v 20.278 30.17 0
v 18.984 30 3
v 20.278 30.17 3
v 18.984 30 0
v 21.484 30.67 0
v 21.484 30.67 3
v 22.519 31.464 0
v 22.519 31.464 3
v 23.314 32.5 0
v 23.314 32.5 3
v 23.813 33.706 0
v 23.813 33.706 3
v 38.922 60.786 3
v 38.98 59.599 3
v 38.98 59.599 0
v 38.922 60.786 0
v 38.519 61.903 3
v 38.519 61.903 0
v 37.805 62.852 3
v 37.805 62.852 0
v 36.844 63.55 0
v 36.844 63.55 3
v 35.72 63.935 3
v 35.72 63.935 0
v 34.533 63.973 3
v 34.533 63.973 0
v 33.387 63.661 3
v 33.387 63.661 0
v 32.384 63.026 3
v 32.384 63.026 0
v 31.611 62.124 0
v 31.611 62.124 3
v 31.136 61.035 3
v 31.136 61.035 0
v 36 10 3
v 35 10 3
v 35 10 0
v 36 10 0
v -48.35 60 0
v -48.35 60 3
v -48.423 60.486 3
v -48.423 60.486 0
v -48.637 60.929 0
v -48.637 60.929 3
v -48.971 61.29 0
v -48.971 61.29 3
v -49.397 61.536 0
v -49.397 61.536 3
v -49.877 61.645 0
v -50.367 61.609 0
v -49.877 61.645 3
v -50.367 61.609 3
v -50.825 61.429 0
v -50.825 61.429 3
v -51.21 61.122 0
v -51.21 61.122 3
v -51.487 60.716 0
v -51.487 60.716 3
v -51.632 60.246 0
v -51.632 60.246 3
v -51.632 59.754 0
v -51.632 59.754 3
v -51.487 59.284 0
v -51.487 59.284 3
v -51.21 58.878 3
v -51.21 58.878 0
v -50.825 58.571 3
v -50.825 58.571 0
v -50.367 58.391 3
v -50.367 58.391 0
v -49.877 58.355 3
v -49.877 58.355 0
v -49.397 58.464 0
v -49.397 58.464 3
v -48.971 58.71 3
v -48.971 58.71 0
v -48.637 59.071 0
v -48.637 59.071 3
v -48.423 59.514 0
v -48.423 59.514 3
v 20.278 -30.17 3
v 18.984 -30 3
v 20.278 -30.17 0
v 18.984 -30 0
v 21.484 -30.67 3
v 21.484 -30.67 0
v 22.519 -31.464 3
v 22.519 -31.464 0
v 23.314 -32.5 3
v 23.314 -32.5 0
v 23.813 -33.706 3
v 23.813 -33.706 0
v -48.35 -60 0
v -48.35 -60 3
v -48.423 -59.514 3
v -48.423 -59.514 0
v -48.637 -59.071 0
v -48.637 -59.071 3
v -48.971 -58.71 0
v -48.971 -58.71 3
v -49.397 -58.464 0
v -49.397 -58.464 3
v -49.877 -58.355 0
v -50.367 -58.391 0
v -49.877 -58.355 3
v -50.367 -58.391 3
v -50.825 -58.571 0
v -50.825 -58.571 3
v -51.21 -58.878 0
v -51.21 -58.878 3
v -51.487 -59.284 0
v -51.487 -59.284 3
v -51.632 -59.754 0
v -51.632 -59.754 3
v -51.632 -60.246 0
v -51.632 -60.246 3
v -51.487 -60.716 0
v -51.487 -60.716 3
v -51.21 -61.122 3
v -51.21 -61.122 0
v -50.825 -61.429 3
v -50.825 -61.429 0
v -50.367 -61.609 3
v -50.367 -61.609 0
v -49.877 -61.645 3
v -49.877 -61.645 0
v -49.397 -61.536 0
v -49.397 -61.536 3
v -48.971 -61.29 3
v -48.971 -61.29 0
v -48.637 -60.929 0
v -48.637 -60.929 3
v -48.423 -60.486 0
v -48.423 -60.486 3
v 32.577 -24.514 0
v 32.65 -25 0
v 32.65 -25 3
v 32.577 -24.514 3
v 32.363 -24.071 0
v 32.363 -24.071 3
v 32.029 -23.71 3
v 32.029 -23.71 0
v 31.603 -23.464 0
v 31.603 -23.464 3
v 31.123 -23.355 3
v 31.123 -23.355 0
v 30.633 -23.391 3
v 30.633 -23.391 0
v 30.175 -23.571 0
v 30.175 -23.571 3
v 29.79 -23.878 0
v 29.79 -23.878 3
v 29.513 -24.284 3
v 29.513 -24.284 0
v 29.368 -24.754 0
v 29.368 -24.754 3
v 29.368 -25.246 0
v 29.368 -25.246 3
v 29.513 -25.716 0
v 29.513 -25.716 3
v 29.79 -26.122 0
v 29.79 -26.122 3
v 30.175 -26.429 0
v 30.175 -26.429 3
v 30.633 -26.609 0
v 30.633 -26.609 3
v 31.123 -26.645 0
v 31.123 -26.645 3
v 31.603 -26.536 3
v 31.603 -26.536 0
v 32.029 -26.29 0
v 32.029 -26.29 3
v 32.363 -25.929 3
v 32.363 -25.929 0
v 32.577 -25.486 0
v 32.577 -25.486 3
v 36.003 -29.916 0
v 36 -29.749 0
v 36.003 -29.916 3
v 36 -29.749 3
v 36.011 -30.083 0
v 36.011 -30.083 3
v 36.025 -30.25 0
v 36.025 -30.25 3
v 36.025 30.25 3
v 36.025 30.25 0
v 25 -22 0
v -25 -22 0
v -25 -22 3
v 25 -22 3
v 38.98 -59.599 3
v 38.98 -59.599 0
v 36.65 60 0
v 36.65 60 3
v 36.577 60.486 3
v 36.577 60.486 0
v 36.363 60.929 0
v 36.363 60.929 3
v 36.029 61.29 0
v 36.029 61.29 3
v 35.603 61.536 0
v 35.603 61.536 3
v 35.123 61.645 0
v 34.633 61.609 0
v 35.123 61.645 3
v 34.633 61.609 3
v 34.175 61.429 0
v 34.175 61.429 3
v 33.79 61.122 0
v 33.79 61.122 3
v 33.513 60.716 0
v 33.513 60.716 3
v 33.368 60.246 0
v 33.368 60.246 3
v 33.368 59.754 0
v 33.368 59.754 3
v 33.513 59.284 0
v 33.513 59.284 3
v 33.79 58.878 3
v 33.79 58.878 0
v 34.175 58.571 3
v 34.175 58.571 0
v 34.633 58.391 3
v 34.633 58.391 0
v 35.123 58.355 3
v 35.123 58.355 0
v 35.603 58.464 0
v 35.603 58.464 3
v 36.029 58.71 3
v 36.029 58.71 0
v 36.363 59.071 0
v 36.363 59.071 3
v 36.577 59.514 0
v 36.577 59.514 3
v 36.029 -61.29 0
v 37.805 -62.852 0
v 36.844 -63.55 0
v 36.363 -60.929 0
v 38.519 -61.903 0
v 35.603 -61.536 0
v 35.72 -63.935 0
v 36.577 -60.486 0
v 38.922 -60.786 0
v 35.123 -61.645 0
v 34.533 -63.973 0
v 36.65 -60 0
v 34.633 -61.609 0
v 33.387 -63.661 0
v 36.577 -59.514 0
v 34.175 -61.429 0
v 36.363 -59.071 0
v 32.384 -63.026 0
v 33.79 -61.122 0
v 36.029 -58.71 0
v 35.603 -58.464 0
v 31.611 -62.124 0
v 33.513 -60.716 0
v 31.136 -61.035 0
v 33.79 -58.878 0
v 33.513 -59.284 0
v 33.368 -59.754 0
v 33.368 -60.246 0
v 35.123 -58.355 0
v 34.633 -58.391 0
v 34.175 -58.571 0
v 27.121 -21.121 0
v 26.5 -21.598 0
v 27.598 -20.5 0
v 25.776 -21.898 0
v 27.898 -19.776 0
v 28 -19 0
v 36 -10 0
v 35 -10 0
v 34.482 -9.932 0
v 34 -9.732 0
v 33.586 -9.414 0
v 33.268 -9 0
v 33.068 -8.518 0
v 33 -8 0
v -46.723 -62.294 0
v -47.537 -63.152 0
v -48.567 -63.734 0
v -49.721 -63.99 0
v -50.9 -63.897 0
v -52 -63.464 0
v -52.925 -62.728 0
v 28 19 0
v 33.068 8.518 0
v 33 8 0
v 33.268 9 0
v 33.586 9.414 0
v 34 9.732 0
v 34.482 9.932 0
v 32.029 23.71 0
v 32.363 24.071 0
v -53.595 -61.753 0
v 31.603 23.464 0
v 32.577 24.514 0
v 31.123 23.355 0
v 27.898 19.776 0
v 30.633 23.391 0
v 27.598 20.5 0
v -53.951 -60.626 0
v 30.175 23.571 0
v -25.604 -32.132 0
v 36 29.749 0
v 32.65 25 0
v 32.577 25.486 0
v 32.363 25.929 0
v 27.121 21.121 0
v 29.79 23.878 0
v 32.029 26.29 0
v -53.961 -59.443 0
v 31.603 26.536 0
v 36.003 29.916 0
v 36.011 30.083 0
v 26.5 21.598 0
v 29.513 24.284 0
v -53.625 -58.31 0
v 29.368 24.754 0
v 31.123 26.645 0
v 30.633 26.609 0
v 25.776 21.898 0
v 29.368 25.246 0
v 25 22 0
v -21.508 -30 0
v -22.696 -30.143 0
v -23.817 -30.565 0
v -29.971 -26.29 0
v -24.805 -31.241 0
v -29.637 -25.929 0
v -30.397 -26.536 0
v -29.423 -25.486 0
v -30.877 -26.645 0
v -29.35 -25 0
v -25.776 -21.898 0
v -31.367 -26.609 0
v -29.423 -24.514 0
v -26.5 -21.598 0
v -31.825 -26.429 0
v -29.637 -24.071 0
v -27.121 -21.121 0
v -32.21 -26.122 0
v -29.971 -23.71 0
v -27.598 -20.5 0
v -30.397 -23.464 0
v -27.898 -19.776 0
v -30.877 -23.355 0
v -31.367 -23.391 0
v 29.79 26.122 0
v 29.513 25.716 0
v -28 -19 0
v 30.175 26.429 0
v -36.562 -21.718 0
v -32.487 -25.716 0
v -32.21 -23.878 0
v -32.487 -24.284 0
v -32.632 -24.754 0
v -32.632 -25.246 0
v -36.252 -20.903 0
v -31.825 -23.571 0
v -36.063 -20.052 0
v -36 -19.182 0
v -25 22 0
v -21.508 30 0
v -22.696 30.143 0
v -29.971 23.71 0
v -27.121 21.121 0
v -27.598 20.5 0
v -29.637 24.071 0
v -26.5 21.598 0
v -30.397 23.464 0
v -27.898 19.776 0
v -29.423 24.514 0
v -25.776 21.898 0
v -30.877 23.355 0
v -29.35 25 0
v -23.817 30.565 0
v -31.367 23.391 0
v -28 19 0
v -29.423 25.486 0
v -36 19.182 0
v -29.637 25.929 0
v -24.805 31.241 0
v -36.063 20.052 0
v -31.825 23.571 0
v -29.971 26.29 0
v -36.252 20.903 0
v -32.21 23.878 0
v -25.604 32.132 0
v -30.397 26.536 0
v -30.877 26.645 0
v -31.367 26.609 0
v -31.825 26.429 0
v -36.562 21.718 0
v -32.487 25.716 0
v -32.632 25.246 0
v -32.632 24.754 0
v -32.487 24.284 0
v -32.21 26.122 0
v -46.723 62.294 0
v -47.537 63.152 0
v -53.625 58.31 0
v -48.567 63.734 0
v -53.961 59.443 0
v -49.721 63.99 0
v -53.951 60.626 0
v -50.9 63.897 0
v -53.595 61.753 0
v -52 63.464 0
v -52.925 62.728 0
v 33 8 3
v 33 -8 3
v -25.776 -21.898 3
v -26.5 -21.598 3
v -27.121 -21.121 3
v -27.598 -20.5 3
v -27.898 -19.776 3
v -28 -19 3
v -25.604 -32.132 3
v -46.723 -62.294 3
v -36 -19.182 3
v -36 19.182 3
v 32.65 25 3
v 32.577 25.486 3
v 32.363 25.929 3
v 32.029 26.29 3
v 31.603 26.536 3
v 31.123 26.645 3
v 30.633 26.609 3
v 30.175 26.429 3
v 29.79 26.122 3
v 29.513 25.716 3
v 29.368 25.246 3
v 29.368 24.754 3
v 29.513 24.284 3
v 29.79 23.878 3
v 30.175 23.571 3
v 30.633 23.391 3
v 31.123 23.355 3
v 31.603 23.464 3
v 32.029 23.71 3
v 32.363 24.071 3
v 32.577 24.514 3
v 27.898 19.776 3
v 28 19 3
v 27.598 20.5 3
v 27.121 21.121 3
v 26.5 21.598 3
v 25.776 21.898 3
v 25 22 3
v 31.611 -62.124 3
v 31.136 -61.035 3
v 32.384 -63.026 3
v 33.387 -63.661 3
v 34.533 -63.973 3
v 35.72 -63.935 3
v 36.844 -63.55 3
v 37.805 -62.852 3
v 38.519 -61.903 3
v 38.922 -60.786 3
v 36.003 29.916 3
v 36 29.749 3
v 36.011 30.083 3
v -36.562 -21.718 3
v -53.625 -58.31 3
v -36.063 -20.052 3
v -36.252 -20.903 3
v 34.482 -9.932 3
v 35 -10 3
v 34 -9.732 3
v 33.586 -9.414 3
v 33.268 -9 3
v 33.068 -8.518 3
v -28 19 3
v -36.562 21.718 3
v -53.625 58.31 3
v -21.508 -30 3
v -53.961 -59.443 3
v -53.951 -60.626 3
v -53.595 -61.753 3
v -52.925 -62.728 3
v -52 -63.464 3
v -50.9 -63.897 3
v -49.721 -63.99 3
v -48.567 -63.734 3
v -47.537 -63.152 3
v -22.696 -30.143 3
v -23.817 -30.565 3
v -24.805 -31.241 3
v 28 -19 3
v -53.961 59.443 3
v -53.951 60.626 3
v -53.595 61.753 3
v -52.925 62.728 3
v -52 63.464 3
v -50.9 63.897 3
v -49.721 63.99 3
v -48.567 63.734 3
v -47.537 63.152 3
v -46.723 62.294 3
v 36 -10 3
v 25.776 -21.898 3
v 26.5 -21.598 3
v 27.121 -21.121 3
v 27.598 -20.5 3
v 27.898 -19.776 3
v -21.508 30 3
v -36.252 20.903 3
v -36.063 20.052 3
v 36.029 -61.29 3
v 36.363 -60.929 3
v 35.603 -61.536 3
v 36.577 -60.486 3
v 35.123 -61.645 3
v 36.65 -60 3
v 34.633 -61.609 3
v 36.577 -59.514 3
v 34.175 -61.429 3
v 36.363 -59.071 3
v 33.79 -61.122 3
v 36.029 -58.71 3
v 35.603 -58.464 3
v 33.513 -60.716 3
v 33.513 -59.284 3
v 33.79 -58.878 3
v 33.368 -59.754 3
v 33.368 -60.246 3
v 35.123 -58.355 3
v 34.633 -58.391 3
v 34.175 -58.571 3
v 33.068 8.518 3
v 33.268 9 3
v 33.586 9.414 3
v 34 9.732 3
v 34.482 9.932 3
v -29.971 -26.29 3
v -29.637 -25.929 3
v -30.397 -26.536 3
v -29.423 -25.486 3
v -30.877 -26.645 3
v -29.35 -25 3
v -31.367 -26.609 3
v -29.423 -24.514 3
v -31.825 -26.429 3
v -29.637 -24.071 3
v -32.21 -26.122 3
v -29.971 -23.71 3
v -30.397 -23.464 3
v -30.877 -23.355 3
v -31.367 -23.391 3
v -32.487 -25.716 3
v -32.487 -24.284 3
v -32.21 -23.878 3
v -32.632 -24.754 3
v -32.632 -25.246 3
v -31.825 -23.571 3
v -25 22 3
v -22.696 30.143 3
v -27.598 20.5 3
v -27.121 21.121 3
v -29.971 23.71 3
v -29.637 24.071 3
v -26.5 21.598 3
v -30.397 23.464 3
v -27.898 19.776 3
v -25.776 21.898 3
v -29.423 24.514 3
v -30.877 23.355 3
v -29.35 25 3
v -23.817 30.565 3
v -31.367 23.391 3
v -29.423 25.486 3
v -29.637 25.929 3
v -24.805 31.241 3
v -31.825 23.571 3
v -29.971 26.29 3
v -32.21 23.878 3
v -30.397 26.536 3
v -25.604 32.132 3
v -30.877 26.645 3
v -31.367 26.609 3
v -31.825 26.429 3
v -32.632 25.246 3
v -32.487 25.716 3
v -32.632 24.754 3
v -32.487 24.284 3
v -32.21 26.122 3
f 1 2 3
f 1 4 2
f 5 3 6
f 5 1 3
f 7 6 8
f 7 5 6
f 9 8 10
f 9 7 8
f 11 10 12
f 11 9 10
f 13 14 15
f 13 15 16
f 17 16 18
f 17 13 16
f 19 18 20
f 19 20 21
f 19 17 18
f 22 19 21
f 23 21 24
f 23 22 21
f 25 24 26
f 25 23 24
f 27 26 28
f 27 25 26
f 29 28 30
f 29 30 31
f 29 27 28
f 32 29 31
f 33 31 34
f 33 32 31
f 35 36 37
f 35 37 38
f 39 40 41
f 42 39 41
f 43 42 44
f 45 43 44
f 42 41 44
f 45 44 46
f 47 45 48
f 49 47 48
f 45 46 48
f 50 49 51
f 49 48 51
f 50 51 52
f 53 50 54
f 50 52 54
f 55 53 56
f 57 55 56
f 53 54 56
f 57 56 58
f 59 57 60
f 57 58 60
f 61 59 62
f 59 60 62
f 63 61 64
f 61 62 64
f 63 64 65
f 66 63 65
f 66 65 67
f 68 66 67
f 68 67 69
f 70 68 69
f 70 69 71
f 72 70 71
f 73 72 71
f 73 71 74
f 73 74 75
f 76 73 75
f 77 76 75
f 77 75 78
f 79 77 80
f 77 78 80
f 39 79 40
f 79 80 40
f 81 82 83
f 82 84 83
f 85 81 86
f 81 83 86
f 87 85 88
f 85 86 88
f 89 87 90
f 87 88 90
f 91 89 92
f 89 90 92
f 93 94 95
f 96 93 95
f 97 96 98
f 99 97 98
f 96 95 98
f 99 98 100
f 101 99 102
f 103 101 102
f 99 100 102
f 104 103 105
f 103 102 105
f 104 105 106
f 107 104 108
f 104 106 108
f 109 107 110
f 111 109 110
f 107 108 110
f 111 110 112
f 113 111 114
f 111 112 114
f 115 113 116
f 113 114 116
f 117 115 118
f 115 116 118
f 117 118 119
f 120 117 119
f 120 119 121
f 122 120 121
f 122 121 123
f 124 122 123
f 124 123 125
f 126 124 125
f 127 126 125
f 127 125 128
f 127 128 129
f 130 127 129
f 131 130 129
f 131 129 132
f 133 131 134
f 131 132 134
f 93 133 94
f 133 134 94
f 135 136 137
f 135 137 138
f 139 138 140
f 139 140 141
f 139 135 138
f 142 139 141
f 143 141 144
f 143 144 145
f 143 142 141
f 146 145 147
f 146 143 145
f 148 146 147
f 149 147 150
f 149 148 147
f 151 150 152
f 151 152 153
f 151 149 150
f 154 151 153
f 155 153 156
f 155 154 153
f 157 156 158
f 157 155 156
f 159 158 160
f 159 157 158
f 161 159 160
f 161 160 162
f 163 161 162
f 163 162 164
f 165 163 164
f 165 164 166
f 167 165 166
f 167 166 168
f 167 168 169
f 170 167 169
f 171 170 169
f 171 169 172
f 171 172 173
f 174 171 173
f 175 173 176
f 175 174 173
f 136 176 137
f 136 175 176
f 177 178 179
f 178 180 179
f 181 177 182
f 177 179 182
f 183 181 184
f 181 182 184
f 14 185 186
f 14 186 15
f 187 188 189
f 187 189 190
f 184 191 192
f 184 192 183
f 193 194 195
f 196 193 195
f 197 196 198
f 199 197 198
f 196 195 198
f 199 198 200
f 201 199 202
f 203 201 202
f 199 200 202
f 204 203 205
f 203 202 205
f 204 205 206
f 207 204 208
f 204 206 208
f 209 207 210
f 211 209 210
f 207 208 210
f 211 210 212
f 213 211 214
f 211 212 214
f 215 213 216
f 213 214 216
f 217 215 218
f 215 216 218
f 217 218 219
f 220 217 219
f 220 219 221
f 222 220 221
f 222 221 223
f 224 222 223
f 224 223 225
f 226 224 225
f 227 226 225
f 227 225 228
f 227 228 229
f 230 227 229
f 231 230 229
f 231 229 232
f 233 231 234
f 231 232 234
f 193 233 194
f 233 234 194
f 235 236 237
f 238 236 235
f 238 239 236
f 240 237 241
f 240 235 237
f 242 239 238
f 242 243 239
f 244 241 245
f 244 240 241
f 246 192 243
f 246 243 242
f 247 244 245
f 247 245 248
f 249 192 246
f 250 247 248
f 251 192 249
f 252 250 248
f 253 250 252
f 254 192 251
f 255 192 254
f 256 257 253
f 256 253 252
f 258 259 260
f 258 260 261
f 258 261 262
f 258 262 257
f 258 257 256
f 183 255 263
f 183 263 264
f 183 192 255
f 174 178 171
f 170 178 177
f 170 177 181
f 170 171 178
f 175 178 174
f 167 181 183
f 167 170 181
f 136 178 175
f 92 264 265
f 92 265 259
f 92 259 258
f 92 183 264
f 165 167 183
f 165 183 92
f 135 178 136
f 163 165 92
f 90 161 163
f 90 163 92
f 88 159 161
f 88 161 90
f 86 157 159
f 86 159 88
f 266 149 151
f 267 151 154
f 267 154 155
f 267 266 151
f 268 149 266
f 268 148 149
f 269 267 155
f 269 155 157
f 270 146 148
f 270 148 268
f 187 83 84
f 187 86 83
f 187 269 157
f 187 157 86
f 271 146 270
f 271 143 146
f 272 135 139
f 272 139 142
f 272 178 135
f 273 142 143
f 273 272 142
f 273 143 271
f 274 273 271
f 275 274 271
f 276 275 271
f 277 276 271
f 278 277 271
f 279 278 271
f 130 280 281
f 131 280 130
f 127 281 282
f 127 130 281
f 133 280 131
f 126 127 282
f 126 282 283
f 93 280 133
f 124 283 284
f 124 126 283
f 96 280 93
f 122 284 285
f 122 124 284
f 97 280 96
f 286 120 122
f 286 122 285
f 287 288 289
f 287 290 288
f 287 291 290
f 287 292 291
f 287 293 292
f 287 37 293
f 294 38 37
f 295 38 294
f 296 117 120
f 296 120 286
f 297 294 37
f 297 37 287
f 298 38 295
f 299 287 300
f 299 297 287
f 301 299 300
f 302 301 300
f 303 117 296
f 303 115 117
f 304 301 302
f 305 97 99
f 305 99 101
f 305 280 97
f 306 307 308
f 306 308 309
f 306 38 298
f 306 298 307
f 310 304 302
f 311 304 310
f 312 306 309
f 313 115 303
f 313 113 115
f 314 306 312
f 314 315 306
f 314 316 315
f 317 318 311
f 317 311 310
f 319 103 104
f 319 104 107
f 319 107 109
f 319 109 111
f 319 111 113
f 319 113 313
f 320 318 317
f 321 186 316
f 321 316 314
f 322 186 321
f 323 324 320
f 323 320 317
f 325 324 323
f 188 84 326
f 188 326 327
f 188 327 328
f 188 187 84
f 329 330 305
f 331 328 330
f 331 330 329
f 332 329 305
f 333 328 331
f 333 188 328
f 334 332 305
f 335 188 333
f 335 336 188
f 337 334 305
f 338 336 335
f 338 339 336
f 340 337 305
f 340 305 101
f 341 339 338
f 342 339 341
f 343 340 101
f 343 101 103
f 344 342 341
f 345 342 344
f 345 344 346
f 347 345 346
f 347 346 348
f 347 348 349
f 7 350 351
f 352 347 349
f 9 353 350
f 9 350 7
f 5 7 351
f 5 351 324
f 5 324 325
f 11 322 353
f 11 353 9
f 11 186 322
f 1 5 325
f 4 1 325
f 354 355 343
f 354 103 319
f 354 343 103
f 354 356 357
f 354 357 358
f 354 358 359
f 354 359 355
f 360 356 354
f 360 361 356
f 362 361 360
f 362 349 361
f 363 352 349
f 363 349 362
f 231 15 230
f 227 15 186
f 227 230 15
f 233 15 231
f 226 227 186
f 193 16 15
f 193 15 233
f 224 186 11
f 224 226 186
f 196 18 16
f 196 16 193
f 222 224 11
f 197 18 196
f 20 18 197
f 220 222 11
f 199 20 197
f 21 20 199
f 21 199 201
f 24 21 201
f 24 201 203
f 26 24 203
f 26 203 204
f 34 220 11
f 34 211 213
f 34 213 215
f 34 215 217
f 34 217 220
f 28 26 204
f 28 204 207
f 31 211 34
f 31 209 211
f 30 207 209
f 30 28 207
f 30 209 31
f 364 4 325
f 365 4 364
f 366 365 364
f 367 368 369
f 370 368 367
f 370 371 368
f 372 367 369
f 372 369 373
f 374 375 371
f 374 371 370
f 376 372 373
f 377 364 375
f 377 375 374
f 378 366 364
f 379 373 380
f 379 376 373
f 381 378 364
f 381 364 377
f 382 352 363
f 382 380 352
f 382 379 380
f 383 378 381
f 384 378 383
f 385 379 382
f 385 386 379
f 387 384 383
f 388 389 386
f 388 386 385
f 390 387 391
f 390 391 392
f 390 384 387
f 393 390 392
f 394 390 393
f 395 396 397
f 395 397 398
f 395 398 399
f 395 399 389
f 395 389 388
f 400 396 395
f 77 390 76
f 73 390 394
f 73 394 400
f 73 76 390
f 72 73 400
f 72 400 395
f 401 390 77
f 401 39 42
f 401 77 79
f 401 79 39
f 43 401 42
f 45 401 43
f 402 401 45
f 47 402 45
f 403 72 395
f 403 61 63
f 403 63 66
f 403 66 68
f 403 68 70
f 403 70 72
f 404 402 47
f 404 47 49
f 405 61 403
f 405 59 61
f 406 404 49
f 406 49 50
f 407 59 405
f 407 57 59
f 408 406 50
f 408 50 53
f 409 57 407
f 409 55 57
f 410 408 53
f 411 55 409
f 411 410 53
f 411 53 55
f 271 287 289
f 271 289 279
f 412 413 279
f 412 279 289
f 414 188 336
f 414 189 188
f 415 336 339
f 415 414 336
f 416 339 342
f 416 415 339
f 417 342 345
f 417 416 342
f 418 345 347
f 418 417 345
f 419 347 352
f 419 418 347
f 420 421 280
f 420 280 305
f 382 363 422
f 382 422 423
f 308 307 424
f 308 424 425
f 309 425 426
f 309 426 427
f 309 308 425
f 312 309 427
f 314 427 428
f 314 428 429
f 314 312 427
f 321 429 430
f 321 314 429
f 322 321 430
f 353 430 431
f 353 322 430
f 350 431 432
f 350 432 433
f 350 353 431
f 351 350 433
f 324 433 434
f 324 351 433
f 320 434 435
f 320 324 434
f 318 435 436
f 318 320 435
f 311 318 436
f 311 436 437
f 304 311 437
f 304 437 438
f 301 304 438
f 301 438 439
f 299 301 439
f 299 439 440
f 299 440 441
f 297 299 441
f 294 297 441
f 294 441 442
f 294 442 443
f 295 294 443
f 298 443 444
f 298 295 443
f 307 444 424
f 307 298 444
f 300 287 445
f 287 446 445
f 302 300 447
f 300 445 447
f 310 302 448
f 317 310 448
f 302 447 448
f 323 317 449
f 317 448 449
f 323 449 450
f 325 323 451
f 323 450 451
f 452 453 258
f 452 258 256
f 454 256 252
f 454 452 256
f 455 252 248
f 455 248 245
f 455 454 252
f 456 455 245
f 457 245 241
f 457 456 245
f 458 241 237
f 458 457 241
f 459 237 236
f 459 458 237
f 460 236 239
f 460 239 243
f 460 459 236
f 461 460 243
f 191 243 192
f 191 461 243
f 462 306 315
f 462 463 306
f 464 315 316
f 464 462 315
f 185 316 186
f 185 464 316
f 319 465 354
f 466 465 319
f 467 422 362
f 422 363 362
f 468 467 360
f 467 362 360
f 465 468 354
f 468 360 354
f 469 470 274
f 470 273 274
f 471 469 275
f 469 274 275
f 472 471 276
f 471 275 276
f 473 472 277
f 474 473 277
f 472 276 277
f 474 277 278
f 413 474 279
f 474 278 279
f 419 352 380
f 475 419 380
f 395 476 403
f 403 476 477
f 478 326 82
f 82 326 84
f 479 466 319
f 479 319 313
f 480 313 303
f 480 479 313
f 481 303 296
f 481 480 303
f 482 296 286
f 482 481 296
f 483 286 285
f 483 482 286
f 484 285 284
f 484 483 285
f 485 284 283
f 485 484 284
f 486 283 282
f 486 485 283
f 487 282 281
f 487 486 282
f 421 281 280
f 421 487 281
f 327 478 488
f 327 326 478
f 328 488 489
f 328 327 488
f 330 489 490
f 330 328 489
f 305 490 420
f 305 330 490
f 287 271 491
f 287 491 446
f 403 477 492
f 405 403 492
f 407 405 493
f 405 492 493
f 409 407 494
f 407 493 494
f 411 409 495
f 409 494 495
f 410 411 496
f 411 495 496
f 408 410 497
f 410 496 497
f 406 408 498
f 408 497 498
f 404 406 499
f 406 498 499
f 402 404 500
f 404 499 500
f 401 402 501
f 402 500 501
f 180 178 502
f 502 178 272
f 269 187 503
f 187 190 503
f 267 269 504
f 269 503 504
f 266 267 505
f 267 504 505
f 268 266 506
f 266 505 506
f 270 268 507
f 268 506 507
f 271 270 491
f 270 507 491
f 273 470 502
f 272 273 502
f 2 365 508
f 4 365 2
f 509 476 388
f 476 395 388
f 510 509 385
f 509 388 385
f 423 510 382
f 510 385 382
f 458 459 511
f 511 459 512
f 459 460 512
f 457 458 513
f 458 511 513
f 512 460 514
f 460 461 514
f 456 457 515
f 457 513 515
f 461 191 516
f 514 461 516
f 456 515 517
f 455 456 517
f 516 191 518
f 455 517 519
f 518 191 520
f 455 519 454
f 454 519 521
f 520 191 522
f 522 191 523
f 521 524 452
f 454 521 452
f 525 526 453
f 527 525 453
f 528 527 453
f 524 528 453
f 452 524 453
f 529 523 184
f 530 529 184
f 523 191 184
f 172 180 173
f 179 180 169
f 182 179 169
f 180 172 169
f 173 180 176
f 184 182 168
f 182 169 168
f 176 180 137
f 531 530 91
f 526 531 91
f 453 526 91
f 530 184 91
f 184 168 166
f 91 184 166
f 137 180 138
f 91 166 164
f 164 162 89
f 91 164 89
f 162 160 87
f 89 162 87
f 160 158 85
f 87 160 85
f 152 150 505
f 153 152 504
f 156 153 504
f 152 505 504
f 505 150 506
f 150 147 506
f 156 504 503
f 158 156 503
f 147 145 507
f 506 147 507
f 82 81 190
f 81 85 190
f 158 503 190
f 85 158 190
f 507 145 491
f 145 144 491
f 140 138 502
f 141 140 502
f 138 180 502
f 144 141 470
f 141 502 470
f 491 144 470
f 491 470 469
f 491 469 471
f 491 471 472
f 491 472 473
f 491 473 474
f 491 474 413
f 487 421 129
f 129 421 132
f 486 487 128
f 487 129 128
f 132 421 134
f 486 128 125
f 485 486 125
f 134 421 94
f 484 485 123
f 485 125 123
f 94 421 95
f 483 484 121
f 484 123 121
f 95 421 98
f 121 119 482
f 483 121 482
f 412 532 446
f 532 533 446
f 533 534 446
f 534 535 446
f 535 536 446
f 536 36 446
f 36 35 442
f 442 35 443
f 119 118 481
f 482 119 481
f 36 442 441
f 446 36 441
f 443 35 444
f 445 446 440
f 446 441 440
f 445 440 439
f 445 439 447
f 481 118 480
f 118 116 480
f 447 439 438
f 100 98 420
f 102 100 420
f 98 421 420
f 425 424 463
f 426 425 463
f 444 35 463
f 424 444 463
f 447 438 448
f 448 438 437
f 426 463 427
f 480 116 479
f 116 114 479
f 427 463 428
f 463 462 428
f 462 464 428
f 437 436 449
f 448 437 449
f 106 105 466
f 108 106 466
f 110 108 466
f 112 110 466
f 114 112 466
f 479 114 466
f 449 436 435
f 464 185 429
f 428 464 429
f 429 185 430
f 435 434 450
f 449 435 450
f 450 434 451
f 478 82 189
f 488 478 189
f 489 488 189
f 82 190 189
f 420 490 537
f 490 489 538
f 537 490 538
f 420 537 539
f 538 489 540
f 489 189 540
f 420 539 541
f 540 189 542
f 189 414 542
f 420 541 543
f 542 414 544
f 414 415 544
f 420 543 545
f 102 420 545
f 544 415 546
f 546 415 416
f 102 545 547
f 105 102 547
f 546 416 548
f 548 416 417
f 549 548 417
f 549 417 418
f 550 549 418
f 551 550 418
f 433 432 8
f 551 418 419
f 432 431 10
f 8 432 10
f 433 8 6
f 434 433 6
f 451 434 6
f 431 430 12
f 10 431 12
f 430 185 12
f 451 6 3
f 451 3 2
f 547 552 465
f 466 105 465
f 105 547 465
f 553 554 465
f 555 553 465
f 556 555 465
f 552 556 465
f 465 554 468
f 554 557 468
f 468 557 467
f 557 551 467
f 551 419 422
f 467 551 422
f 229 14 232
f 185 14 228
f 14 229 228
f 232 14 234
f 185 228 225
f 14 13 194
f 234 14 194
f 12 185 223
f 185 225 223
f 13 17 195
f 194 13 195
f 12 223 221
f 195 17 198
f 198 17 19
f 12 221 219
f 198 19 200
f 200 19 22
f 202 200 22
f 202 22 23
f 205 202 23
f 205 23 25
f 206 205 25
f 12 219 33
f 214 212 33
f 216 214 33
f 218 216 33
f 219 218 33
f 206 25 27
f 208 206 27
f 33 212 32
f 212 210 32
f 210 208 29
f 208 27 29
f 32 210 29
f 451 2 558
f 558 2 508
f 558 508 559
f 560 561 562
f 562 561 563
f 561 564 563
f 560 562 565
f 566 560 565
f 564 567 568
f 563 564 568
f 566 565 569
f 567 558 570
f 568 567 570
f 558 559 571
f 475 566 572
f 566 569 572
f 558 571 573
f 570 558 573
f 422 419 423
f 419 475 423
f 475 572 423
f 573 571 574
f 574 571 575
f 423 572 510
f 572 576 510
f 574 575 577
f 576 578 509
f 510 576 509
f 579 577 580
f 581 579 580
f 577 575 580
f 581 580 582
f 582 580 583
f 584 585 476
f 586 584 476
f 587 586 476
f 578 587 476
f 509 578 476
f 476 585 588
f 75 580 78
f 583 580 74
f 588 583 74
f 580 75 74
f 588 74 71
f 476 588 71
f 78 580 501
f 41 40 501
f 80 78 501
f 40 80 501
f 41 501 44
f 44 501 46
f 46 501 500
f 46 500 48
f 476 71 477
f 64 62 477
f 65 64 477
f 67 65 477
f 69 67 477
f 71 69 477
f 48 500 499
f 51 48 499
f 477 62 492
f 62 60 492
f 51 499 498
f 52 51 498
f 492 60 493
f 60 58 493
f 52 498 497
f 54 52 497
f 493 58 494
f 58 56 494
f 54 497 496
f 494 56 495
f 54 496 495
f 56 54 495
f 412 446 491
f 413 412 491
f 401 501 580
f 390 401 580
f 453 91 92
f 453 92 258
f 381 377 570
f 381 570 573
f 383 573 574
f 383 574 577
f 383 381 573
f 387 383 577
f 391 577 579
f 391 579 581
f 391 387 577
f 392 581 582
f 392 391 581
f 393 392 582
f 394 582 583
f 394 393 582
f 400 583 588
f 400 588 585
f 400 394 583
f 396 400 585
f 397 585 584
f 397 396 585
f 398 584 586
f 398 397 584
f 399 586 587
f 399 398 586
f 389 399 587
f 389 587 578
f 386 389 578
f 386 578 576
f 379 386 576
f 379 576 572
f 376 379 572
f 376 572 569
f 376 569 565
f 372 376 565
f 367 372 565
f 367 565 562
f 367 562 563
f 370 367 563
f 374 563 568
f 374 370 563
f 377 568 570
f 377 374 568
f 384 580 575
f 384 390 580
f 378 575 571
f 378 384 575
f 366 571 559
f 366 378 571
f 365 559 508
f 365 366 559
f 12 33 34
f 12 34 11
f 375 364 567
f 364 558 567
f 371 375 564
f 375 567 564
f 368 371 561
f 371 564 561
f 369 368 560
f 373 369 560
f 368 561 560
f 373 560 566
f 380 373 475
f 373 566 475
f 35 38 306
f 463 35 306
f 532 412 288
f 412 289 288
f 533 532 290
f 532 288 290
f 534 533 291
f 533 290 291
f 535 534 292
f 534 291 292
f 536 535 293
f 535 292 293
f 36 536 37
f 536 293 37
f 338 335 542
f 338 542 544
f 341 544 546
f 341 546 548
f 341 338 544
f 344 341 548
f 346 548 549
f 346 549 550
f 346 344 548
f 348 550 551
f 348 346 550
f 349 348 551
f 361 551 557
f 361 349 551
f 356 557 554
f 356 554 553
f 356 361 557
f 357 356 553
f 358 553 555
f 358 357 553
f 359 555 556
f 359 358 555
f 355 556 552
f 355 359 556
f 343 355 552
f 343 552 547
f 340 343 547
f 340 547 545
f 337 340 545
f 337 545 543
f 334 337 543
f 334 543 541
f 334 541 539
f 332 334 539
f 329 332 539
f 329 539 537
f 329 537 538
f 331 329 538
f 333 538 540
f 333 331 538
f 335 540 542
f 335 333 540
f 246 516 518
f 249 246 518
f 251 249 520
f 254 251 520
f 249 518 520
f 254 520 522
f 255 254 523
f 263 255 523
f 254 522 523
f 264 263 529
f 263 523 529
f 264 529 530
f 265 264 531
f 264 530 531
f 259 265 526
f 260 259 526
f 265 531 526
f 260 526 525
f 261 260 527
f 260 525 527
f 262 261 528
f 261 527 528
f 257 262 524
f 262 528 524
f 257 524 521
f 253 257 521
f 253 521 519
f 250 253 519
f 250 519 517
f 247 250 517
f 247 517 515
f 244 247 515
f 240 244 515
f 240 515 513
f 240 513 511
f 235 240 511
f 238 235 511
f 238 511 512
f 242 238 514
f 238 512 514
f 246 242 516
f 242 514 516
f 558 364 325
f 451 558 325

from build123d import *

# Parameters (mm, degrees)
SKETCH_1_W          = 72
SKETCH_1_H          = 60
SKETCH_1_R          = 1.65
SKETCH_1_W_2        = 56
SKETCH_1_H_2        = 44
EXTRUDE_1_DEPTH     = 3
FILLET_1_R          = 3
SKETCH_2_R          = 1.65
EXTRUDE_2_DEPTH     = 3
FILLET_2_R          = 5
FILLET_3_R          = 6
SKETCH_3_W          = 6
SKETCH_3_H          = 20
CUT_EXTRUDE_1_DEPTH = 4
FILLET_4_R          = 2


with BuildPart() as part:
    # 草图1 → 凸台-拉伸1 (new body)
    with BuildSketch(Plane.XY):
        Rectangle(SKETCH_1_W, SKETCH_1_H)
        with Locations((31, -25)):
            Circle(SKETCH_1_R, mode=Mode.SUBTRACT)
        with Locations((31, 25)):
            Circle(SKETCH_1_R, mode=Mode.SUBTRACT)
        with Locations((-31, 25)):
            Circle(SKETCH_1_R, mode=Mode.SUBTRACT)
        with Locations((-31, -25)):
            Circle(SKETCH_1_R, mode=Mode.SUBTRACT)
        Rectangle(SKETCH_1_W_2, SKETCH_1_H_2, mode=Mode.SUBTRACT)
    extrude(amount=EXTRUDE_1_DEPTH)

    # 圆角1
    fillet_1_edges = [part.edges().sort_by_distance(p)[0] for p in [
        (-28, 22, 1.5),
        (-28, -22, 1.5),
        (28, -22, 1.5),
        (28, 22, 1.5),
    ]]
    fillet(fillet_1_edges, radius=FILLET_1_R)

    # 草图2 → 凸台-拉伸2 (add)
    with BuildSketch(Plane.XY.offset(3)):
        with BuildLine():
            Line((-46.723391823, 62.294305745), (-24.110675499, 30))
            Line((-24.110675499, 30), (-36, 30))
            Line((-36, 30), (-36, 20.51209678))
            Line((-36, 20.51209678), (-53.625231148, 58.309526953))
            ThreePointArc((-53.625231148, 58.309526953), (-52, 63.464101615), (-46.723391823, 62.294305745))
        make_face()
        with Locations((-50, 60)):
            Circle(SKETCH_2_R, mode=Mode.SUBTRACT)
        with BuildLine():
            Line((-46.723391823, -62.294305745), (-24.110675499, -30))
            Line((-24.110675499, -30), (-36, -30))
            Line((-36, -30), (-36, -20.51209678))
            Line((-36, -20.51209678), (-53.625231148, -58.309526953))
            ThreePointArc((-53.625231148, -58.309526953), (-52, -63.464101615), (-46.723391823, -62.294305745))
        make_face()
        with Locations((-50, -60)):
            Circle(SKETCH_2_R, mode=Mode.SUBTRACT)
        with BuildLine():
            Line((31.136296695, 61.03527618), (22.820419505, 30))
            Line((22.820419505, 30), (36, 30))
            Line((36, 30), (38.979882295, 59.59932941))
            ThreePointArc((38.979882295, 59.59932941), (35.720319493, 63.934607964), (31.136296695, 61.03527618))
        make_face()
        with Locations((35, 60)):
            Circle(SKETCH_2_R, mode=Mode.SUBTRACT)
        with BuildLine():
            Line((38.979882295, -59.59932941), (36, -30))
            Line((36, -30), (22.820419505, -30))
            Line((22.820419505, -30), (31.136296695, -61.03527618))
            ThreePointArc((31.136296695, -61.03527618), (35.720319493, -63.934607964), (38.979882295, -59.59932941))
        make_face()
        with Locations((35, -60)):
            Circle(SKETCH_2_R, mode=Mode.SUBTRACT)
    extrude(amount=-EXTRUDE_2_DEPTH)

    # 圆角2
    fillet_2_edges = [part.edges().sort_by_distance(p)[0] for p in [
        (22.820419505, -30, 1.5),
        (22.820419505, 30, 1.5),
        (-24.110675499, 30, 1.5),
        (36, 30, 1.5),
        (36, -30, 1.5),
        (-24.110675499, -30, 1.5),
    ]]
    fillet(fillet_2_edges, radius=FILLET_2_R)

    # 圆角3
    fillet_3_edges = [part.edges().sort_by_distance(p)[0] for p in [
        (-36, 20.51209678, 1.5),
        (-36, -20.51209678, 1.5),
    ]]
    fillet(fillet_3_edges, radius=FILLET_3_R)

    # 草图3 → 切除-拉伸1 (cut, through all)
    with BuildSketch(Plane.XY.offset(3)):
        with Locations((36, 0)):
            Rectangle(SKETCH_3_W, SKETCH_3_H)
    extrude(amount=-CUT_EXTRUDE_1_DEPTH, mode=Mode.SUBTRACT)

    # 圆角4
    fillet_4_edges = [part.edges().sort_by_distance(p)[0] for p in [
        (33, 10, 1.5),
        (33, -10, 1.5),
    ]]
    fillet(fillet_4_edges, radius=FILLET_4_R)


solid = part.part
